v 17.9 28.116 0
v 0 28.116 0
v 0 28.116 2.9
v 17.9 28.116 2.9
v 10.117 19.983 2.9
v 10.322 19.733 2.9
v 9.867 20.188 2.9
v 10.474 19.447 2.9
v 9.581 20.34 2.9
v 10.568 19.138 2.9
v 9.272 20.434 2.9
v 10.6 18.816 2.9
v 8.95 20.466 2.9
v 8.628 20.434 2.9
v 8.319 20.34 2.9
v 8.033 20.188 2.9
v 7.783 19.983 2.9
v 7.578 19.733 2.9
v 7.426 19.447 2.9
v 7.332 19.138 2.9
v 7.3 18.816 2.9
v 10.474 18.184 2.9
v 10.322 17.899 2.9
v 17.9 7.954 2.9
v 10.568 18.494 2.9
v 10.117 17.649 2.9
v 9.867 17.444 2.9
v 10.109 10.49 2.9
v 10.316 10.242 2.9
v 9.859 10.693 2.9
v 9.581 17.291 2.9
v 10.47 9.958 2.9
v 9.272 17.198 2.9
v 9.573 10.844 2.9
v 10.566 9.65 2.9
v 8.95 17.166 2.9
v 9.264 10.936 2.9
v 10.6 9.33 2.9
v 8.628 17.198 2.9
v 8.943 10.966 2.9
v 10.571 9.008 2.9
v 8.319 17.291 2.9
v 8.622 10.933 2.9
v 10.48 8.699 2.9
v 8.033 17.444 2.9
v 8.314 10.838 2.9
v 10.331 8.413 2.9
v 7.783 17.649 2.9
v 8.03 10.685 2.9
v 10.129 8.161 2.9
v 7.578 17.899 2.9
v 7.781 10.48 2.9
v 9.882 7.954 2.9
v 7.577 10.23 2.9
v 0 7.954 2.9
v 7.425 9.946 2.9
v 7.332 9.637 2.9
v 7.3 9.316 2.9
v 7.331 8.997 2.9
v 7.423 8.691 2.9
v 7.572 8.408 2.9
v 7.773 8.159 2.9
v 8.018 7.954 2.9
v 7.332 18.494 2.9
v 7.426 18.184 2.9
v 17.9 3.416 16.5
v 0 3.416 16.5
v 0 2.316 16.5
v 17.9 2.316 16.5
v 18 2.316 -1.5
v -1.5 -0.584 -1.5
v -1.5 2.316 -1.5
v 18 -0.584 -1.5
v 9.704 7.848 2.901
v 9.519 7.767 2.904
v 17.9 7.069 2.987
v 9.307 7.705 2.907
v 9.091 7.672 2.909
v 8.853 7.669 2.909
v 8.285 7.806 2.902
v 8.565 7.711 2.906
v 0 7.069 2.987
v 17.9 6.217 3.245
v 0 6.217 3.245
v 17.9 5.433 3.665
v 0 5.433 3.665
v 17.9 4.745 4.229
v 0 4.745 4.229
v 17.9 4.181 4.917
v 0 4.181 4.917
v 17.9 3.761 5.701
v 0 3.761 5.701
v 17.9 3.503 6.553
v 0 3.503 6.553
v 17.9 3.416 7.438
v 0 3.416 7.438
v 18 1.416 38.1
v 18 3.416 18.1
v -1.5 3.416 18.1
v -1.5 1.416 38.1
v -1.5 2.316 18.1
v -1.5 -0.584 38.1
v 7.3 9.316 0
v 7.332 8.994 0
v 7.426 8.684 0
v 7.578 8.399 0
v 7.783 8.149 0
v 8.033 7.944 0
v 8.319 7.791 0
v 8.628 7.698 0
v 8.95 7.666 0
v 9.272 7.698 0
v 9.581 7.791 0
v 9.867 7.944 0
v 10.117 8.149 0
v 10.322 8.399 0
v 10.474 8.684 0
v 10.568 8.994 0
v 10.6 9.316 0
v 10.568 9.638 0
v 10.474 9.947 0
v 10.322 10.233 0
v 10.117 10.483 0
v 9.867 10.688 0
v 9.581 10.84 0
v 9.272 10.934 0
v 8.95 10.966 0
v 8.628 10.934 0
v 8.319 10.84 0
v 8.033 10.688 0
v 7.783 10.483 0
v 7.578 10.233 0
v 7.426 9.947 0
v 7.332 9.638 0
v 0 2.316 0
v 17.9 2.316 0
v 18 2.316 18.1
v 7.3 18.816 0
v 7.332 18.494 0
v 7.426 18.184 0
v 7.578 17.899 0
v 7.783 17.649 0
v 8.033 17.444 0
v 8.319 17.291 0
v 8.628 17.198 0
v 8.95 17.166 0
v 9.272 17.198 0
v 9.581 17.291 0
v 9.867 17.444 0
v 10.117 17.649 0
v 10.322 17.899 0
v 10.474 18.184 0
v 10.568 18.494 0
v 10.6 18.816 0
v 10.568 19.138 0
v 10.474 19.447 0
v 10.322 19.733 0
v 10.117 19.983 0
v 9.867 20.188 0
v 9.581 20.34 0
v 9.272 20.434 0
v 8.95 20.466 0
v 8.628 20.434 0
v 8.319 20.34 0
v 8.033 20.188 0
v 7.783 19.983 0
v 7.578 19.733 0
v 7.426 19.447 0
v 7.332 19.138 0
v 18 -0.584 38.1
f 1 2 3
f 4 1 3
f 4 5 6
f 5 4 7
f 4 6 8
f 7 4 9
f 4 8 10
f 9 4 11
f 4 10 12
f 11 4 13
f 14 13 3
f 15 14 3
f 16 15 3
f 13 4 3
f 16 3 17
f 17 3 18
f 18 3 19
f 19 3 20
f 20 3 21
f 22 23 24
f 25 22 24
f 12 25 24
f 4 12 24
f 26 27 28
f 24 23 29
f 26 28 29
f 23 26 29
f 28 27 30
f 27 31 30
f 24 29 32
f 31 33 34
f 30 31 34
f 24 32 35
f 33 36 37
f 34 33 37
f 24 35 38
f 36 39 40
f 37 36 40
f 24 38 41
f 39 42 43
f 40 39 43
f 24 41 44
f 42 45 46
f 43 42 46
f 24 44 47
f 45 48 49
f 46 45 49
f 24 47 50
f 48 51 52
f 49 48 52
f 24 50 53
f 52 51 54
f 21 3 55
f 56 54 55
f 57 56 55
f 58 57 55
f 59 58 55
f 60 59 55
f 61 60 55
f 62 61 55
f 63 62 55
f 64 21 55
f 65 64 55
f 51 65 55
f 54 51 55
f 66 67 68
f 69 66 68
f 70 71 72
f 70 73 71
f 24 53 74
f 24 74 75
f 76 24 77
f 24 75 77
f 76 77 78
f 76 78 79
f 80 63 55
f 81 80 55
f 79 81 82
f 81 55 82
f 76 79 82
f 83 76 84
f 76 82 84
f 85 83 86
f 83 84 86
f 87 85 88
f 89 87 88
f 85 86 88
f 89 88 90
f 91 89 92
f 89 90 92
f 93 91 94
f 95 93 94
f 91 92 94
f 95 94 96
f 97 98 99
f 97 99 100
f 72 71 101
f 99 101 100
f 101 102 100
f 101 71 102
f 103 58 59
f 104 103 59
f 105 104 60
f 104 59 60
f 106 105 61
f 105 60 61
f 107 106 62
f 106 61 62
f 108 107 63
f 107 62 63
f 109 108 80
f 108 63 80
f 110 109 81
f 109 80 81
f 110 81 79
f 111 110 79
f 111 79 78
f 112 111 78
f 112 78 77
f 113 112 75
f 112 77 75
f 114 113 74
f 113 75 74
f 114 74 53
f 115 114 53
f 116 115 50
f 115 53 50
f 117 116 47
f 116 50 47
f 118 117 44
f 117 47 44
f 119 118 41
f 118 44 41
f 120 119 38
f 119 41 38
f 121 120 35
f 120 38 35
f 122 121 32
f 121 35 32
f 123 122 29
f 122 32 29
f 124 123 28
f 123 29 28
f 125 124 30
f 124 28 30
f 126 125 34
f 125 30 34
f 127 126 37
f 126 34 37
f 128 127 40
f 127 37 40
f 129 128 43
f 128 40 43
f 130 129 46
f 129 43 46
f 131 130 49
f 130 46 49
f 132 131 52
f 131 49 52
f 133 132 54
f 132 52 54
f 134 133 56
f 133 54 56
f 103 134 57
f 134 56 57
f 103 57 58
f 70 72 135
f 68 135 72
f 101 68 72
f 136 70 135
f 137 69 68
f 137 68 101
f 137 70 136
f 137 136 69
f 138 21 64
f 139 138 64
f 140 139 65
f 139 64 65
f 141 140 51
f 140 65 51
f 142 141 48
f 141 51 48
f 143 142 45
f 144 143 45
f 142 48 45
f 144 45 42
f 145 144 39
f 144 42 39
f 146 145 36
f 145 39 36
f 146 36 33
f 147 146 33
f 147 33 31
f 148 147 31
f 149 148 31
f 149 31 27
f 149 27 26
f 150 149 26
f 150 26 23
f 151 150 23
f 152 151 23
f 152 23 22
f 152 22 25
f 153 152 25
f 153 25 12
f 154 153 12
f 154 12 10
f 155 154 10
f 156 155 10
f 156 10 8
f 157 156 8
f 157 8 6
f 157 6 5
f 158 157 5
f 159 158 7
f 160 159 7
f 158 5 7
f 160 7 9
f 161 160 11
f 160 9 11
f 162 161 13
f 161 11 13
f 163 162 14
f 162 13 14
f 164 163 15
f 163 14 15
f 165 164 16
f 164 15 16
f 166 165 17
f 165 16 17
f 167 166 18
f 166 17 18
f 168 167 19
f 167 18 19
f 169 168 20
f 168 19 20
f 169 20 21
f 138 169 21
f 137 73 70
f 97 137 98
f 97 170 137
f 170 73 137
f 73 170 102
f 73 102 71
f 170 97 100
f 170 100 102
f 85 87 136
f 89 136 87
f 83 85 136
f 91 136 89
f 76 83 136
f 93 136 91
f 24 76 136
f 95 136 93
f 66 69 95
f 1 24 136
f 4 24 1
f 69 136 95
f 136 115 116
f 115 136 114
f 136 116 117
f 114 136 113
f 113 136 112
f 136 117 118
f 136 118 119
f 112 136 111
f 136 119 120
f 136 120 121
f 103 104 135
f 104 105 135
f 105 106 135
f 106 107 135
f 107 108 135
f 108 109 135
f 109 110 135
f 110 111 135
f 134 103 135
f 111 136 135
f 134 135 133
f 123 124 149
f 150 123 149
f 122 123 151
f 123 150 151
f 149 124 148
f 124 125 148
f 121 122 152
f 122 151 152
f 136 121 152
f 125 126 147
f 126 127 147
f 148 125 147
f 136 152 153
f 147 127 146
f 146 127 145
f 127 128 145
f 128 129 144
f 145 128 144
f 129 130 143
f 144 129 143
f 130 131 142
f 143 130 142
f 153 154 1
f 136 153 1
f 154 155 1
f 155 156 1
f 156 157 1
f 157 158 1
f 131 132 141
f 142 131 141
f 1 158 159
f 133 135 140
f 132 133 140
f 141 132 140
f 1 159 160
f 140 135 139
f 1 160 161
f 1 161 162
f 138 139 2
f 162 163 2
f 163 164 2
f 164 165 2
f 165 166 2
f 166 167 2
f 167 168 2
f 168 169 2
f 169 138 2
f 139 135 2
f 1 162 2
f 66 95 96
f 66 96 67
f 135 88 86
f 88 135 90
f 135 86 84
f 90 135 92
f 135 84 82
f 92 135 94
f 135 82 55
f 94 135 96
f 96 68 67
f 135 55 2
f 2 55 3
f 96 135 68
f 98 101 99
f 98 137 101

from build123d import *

# Parameters (mm, degrees)
F1_DEPTH      = 17.9
F0_W          = 2.9
F0_H          = 16.5
F0_H_2        = 1.5
F2_DEPTH      = 18
F2_DEPTH_BACK = 1.5
F4_D          = 3.3


# Not quite as in the source:
# - a feature names something its author has since deleted; it is built from what else it names


with BuildPart() as f1:
    # F0 (on Right) → F1 (new body)
    with BuildSketch(Plane.YZ):
        Polygon((3.4158524887, 16.5), (2.3158524887, 16.5), (2.3158524887, 0), (3.4158524887, 0), (3.4158524887, 7.4381744285), align=None)
        with BuildLine():
            ThreePointArc((7.9540269172, 2.9), (4.7450530046, 4.2292005159), (3.4158524887, 7.4381744285))
            Line((3.4158524887, 7.4381744285), (3.4158524887, 0))
            Line((3.4158524887, 0), (9.4158524887, 0))
            Line((9.4158524887, 0), (12.5158524887, 0))
            Line((12.5158524887, 0), (22.0158524887, 0))
            Line((22.0158524887, 0), (25.1158524887, 0))
            Line((25.1158524887, 0), (28.1158524887, 0))
            Line((28.1158524887, 0), (28.1158524887, 2.9))
            Line((28.1158524887, 2.9), (25.1158524887, 2.9))
            Line((25.1158524887, 2.9), (22.0158524887, 2.9))
            Line((22.0158524887, 2.9), (12.5158524887, 2.9))
            Line((12.5158524887, 2.9), (9.4158524887, 2.9))
            Line((9.4158524887, 2.9), (7.9540269172, 2.9))
        make_face()
    extrude(amount=F1_DEPTH)

    # F0 (on Right) → F2 (join, two sides)
    with BuildSketch(Plane.YZ) as f2_sk:
        with Locations((0.8658524887, 8.25)):
            Rectangle(F0_W, F0_H)
        Polygon((-0.5841475113, 18.1), (-0.5841475113, 16.5), (2.3158524887, 16.5), (2.3158524887, 18.1), (3.4158524887, 18.1), (1.4158524887, 38.1), (-0.5841475113, 38.1), align=None)
        with Locations((0.8658524887, -0.75)):
            Rectangle(F0_W, F0_H_2)
    extrude(amount=F2_DEPTH)
    extrude(f2_sk.sketch, amount=-F2_DEPTH_BACK)

    # F4 (through all)
    with Locations(Plane(origin=(0, 0, 0), x_dir=(1, 0, 0), z_dir=(0, 0, -1))):
        with Locations((8.95, -9.3158524887), (8.95, -18.8158524887)):
            Hole(F4_D / 2)


solid = f1.part
